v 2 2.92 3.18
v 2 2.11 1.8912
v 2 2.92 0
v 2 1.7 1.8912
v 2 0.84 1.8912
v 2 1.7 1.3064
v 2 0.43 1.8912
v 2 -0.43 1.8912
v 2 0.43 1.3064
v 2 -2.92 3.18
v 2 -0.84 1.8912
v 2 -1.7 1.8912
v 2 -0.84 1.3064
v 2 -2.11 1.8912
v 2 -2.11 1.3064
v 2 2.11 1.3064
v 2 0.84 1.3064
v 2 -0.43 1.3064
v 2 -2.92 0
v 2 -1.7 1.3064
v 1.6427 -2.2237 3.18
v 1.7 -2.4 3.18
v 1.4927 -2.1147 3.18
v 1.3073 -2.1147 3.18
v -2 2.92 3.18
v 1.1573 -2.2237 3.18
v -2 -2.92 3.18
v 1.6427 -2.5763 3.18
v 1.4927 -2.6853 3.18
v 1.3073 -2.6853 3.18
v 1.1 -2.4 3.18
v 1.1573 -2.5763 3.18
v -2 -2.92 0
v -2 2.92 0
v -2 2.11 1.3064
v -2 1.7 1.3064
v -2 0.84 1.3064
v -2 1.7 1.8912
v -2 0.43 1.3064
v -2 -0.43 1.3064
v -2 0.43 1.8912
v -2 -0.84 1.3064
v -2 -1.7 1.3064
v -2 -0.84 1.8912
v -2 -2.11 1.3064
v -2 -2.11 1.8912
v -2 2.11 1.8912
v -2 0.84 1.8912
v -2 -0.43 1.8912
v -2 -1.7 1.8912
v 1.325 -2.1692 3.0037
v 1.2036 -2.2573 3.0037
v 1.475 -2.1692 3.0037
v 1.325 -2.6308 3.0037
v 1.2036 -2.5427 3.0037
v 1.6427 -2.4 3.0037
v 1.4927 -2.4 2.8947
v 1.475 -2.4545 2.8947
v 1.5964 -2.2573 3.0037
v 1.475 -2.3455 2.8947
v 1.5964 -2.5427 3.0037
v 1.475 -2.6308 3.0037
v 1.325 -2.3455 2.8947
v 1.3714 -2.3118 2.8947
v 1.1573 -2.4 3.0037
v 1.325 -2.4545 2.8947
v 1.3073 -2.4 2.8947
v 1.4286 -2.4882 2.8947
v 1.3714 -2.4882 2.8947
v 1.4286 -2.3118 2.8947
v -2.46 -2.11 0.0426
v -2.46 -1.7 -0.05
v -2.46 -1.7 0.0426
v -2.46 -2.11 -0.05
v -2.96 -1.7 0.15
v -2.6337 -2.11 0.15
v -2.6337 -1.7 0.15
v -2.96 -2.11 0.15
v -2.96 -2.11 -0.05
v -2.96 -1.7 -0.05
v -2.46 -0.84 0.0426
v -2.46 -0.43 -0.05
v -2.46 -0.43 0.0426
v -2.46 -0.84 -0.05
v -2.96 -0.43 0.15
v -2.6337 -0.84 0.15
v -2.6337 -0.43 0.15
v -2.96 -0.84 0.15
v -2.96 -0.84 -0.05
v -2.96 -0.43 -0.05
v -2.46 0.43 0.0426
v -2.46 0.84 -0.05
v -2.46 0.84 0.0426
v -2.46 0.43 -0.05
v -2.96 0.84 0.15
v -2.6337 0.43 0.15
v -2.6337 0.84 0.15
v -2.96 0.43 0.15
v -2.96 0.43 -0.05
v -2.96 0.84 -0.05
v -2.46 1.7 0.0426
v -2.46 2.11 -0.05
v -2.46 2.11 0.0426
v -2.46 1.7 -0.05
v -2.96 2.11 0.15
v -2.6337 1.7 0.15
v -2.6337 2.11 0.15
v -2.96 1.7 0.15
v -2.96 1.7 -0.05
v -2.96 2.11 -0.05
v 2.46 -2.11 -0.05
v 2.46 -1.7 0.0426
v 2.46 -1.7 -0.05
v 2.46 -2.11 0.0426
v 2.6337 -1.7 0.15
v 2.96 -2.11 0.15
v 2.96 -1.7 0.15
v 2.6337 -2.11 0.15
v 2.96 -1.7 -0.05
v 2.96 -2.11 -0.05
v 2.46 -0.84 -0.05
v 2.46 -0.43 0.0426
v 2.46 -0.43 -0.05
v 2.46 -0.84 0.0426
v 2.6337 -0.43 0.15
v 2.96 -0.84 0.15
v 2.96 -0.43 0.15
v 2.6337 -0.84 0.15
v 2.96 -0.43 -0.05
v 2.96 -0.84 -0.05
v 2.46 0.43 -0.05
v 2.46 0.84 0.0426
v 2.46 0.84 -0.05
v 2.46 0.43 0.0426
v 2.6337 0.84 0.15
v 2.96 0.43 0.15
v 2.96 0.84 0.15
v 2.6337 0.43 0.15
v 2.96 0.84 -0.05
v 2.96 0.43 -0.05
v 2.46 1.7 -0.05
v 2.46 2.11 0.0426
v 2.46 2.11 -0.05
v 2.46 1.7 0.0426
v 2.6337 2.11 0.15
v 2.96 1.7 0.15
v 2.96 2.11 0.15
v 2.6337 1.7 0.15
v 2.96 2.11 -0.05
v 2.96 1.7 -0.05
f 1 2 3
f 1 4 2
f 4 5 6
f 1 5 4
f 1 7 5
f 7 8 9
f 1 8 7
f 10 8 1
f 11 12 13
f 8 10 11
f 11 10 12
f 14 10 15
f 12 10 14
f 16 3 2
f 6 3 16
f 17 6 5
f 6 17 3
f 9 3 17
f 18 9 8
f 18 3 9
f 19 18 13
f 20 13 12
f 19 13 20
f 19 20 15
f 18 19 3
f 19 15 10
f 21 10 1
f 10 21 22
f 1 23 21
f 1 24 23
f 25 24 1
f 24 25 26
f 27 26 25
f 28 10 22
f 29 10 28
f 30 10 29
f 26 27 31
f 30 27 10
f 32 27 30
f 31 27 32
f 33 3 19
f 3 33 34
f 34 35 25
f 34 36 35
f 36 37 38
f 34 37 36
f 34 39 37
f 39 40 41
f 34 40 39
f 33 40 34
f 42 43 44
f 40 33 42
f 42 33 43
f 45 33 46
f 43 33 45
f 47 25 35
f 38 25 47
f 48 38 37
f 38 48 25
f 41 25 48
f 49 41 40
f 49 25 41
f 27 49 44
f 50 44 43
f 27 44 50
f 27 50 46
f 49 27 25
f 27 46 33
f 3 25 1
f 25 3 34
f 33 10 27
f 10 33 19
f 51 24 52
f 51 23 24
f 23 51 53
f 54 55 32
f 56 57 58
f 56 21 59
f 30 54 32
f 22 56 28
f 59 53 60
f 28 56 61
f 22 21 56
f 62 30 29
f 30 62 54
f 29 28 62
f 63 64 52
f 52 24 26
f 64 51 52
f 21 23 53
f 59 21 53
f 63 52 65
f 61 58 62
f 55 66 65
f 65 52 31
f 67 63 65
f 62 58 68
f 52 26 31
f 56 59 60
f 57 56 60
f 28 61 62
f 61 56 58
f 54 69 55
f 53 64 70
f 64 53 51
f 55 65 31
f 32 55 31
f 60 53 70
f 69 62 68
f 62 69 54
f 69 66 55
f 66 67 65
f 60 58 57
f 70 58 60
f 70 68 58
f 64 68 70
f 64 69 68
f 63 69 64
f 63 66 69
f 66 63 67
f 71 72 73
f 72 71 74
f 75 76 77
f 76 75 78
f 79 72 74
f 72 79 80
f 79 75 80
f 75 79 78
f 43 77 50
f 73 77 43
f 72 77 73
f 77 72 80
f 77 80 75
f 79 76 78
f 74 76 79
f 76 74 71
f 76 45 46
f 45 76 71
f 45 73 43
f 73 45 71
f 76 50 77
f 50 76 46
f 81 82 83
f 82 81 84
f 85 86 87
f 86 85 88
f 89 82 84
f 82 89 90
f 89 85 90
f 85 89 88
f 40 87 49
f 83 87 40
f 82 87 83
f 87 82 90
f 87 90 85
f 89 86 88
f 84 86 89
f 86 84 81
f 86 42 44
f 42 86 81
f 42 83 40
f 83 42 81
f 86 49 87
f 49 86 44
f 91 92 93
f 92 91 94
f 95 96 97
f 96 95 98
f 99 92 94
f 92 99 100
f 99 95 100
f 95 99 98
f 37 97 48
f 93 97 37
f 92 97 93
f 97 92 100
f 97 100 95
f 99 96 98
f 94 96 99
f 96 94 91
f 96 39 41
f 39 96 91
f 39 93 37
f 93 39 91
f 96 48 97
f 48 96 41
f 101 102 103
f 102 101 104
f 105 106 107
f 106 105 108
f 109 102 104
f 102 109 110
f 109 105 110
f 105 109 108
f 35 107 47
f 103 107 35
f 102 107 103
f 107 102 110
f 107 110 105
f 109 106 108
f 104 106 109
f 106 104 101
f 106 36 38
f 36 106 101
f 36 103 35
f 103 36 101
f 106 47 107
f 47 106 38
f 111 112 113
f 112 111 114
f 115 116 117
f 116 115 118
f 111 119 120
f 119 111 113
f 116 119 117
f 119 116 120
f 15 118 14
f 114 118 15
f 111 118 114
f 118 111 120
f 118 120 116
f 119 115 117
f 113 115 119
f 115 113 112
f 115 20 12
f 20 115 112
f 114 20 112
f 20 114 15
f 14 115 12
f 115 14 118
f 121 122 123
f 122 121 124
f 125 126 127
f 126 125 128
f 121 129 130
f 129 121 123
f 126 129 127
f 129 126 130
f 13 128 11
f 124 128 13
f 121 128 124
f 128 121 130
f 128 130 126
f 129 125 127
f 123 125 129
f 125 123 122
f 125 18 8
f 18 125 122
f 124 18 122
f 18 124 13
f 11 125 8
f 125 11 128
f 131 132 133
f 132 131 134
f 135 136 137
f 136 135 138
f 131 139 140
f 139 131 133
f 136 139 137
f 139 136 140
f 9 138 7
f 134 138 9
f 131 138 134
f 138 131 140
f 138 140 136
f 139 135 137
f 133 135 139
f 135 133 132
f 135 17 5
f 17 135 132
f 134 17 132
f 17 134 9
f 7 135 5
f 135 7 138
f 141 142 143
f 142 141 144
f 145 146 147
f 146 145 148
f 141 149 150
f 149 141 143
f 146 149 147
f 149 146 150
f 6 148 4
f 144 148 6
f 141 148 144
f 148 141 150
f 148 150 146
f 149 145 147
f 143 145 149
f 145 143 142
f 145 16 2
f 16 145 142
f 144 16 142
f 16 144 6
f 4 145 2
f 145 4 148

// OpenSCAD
/*
 * A generic SOIC 4mm wide, 5.8mm long, 1.27mm pitch packaged part.
 *
 * Author: Ian McInerney
 * Created: July 16, 2015
 *
 */

module pin() {
	translate([0,0.0,0.0])cube([0.5,0.41,0.20], center=true);
	translate([0.23,0.0,0.23])rotate([0.0,20,0.0])translate([0.0,0.0,0.7])cube([0.2,0.41,2.0], center=true);
}


// Assemble the main package and the pins
module main() {
		translate([0.0,0.0,3.18/2])cube([4.0,5.84,3.18], center=true);
}

// Add the marker for pin 1
difference() {
	// The main cube
	main();

	// The pin 1 marker
	translate([1.4,-2.4,3.18])sphere(r=0.3, $fn=10);
}

translate([-2.71,-1.905,0.05])pin();
translate([-2.71,-0.635,0.05])pin();
translate([-2.71,0.635,0.05])pin();
translate([-2.71,1.905,0.05])pin();

translate([2.71,-1.905,0.05])rotate([0.0,0.0,180])pin();
translate([2.71,-0.635,0.05])rotate([0.0,0.0,180])pin();
translate([2.71,0.635,0.05])rotate([0.0,0.0,180])pin();
translate([2.71,1.905,0.05])rotate([0.0,0.0,180])pin();
